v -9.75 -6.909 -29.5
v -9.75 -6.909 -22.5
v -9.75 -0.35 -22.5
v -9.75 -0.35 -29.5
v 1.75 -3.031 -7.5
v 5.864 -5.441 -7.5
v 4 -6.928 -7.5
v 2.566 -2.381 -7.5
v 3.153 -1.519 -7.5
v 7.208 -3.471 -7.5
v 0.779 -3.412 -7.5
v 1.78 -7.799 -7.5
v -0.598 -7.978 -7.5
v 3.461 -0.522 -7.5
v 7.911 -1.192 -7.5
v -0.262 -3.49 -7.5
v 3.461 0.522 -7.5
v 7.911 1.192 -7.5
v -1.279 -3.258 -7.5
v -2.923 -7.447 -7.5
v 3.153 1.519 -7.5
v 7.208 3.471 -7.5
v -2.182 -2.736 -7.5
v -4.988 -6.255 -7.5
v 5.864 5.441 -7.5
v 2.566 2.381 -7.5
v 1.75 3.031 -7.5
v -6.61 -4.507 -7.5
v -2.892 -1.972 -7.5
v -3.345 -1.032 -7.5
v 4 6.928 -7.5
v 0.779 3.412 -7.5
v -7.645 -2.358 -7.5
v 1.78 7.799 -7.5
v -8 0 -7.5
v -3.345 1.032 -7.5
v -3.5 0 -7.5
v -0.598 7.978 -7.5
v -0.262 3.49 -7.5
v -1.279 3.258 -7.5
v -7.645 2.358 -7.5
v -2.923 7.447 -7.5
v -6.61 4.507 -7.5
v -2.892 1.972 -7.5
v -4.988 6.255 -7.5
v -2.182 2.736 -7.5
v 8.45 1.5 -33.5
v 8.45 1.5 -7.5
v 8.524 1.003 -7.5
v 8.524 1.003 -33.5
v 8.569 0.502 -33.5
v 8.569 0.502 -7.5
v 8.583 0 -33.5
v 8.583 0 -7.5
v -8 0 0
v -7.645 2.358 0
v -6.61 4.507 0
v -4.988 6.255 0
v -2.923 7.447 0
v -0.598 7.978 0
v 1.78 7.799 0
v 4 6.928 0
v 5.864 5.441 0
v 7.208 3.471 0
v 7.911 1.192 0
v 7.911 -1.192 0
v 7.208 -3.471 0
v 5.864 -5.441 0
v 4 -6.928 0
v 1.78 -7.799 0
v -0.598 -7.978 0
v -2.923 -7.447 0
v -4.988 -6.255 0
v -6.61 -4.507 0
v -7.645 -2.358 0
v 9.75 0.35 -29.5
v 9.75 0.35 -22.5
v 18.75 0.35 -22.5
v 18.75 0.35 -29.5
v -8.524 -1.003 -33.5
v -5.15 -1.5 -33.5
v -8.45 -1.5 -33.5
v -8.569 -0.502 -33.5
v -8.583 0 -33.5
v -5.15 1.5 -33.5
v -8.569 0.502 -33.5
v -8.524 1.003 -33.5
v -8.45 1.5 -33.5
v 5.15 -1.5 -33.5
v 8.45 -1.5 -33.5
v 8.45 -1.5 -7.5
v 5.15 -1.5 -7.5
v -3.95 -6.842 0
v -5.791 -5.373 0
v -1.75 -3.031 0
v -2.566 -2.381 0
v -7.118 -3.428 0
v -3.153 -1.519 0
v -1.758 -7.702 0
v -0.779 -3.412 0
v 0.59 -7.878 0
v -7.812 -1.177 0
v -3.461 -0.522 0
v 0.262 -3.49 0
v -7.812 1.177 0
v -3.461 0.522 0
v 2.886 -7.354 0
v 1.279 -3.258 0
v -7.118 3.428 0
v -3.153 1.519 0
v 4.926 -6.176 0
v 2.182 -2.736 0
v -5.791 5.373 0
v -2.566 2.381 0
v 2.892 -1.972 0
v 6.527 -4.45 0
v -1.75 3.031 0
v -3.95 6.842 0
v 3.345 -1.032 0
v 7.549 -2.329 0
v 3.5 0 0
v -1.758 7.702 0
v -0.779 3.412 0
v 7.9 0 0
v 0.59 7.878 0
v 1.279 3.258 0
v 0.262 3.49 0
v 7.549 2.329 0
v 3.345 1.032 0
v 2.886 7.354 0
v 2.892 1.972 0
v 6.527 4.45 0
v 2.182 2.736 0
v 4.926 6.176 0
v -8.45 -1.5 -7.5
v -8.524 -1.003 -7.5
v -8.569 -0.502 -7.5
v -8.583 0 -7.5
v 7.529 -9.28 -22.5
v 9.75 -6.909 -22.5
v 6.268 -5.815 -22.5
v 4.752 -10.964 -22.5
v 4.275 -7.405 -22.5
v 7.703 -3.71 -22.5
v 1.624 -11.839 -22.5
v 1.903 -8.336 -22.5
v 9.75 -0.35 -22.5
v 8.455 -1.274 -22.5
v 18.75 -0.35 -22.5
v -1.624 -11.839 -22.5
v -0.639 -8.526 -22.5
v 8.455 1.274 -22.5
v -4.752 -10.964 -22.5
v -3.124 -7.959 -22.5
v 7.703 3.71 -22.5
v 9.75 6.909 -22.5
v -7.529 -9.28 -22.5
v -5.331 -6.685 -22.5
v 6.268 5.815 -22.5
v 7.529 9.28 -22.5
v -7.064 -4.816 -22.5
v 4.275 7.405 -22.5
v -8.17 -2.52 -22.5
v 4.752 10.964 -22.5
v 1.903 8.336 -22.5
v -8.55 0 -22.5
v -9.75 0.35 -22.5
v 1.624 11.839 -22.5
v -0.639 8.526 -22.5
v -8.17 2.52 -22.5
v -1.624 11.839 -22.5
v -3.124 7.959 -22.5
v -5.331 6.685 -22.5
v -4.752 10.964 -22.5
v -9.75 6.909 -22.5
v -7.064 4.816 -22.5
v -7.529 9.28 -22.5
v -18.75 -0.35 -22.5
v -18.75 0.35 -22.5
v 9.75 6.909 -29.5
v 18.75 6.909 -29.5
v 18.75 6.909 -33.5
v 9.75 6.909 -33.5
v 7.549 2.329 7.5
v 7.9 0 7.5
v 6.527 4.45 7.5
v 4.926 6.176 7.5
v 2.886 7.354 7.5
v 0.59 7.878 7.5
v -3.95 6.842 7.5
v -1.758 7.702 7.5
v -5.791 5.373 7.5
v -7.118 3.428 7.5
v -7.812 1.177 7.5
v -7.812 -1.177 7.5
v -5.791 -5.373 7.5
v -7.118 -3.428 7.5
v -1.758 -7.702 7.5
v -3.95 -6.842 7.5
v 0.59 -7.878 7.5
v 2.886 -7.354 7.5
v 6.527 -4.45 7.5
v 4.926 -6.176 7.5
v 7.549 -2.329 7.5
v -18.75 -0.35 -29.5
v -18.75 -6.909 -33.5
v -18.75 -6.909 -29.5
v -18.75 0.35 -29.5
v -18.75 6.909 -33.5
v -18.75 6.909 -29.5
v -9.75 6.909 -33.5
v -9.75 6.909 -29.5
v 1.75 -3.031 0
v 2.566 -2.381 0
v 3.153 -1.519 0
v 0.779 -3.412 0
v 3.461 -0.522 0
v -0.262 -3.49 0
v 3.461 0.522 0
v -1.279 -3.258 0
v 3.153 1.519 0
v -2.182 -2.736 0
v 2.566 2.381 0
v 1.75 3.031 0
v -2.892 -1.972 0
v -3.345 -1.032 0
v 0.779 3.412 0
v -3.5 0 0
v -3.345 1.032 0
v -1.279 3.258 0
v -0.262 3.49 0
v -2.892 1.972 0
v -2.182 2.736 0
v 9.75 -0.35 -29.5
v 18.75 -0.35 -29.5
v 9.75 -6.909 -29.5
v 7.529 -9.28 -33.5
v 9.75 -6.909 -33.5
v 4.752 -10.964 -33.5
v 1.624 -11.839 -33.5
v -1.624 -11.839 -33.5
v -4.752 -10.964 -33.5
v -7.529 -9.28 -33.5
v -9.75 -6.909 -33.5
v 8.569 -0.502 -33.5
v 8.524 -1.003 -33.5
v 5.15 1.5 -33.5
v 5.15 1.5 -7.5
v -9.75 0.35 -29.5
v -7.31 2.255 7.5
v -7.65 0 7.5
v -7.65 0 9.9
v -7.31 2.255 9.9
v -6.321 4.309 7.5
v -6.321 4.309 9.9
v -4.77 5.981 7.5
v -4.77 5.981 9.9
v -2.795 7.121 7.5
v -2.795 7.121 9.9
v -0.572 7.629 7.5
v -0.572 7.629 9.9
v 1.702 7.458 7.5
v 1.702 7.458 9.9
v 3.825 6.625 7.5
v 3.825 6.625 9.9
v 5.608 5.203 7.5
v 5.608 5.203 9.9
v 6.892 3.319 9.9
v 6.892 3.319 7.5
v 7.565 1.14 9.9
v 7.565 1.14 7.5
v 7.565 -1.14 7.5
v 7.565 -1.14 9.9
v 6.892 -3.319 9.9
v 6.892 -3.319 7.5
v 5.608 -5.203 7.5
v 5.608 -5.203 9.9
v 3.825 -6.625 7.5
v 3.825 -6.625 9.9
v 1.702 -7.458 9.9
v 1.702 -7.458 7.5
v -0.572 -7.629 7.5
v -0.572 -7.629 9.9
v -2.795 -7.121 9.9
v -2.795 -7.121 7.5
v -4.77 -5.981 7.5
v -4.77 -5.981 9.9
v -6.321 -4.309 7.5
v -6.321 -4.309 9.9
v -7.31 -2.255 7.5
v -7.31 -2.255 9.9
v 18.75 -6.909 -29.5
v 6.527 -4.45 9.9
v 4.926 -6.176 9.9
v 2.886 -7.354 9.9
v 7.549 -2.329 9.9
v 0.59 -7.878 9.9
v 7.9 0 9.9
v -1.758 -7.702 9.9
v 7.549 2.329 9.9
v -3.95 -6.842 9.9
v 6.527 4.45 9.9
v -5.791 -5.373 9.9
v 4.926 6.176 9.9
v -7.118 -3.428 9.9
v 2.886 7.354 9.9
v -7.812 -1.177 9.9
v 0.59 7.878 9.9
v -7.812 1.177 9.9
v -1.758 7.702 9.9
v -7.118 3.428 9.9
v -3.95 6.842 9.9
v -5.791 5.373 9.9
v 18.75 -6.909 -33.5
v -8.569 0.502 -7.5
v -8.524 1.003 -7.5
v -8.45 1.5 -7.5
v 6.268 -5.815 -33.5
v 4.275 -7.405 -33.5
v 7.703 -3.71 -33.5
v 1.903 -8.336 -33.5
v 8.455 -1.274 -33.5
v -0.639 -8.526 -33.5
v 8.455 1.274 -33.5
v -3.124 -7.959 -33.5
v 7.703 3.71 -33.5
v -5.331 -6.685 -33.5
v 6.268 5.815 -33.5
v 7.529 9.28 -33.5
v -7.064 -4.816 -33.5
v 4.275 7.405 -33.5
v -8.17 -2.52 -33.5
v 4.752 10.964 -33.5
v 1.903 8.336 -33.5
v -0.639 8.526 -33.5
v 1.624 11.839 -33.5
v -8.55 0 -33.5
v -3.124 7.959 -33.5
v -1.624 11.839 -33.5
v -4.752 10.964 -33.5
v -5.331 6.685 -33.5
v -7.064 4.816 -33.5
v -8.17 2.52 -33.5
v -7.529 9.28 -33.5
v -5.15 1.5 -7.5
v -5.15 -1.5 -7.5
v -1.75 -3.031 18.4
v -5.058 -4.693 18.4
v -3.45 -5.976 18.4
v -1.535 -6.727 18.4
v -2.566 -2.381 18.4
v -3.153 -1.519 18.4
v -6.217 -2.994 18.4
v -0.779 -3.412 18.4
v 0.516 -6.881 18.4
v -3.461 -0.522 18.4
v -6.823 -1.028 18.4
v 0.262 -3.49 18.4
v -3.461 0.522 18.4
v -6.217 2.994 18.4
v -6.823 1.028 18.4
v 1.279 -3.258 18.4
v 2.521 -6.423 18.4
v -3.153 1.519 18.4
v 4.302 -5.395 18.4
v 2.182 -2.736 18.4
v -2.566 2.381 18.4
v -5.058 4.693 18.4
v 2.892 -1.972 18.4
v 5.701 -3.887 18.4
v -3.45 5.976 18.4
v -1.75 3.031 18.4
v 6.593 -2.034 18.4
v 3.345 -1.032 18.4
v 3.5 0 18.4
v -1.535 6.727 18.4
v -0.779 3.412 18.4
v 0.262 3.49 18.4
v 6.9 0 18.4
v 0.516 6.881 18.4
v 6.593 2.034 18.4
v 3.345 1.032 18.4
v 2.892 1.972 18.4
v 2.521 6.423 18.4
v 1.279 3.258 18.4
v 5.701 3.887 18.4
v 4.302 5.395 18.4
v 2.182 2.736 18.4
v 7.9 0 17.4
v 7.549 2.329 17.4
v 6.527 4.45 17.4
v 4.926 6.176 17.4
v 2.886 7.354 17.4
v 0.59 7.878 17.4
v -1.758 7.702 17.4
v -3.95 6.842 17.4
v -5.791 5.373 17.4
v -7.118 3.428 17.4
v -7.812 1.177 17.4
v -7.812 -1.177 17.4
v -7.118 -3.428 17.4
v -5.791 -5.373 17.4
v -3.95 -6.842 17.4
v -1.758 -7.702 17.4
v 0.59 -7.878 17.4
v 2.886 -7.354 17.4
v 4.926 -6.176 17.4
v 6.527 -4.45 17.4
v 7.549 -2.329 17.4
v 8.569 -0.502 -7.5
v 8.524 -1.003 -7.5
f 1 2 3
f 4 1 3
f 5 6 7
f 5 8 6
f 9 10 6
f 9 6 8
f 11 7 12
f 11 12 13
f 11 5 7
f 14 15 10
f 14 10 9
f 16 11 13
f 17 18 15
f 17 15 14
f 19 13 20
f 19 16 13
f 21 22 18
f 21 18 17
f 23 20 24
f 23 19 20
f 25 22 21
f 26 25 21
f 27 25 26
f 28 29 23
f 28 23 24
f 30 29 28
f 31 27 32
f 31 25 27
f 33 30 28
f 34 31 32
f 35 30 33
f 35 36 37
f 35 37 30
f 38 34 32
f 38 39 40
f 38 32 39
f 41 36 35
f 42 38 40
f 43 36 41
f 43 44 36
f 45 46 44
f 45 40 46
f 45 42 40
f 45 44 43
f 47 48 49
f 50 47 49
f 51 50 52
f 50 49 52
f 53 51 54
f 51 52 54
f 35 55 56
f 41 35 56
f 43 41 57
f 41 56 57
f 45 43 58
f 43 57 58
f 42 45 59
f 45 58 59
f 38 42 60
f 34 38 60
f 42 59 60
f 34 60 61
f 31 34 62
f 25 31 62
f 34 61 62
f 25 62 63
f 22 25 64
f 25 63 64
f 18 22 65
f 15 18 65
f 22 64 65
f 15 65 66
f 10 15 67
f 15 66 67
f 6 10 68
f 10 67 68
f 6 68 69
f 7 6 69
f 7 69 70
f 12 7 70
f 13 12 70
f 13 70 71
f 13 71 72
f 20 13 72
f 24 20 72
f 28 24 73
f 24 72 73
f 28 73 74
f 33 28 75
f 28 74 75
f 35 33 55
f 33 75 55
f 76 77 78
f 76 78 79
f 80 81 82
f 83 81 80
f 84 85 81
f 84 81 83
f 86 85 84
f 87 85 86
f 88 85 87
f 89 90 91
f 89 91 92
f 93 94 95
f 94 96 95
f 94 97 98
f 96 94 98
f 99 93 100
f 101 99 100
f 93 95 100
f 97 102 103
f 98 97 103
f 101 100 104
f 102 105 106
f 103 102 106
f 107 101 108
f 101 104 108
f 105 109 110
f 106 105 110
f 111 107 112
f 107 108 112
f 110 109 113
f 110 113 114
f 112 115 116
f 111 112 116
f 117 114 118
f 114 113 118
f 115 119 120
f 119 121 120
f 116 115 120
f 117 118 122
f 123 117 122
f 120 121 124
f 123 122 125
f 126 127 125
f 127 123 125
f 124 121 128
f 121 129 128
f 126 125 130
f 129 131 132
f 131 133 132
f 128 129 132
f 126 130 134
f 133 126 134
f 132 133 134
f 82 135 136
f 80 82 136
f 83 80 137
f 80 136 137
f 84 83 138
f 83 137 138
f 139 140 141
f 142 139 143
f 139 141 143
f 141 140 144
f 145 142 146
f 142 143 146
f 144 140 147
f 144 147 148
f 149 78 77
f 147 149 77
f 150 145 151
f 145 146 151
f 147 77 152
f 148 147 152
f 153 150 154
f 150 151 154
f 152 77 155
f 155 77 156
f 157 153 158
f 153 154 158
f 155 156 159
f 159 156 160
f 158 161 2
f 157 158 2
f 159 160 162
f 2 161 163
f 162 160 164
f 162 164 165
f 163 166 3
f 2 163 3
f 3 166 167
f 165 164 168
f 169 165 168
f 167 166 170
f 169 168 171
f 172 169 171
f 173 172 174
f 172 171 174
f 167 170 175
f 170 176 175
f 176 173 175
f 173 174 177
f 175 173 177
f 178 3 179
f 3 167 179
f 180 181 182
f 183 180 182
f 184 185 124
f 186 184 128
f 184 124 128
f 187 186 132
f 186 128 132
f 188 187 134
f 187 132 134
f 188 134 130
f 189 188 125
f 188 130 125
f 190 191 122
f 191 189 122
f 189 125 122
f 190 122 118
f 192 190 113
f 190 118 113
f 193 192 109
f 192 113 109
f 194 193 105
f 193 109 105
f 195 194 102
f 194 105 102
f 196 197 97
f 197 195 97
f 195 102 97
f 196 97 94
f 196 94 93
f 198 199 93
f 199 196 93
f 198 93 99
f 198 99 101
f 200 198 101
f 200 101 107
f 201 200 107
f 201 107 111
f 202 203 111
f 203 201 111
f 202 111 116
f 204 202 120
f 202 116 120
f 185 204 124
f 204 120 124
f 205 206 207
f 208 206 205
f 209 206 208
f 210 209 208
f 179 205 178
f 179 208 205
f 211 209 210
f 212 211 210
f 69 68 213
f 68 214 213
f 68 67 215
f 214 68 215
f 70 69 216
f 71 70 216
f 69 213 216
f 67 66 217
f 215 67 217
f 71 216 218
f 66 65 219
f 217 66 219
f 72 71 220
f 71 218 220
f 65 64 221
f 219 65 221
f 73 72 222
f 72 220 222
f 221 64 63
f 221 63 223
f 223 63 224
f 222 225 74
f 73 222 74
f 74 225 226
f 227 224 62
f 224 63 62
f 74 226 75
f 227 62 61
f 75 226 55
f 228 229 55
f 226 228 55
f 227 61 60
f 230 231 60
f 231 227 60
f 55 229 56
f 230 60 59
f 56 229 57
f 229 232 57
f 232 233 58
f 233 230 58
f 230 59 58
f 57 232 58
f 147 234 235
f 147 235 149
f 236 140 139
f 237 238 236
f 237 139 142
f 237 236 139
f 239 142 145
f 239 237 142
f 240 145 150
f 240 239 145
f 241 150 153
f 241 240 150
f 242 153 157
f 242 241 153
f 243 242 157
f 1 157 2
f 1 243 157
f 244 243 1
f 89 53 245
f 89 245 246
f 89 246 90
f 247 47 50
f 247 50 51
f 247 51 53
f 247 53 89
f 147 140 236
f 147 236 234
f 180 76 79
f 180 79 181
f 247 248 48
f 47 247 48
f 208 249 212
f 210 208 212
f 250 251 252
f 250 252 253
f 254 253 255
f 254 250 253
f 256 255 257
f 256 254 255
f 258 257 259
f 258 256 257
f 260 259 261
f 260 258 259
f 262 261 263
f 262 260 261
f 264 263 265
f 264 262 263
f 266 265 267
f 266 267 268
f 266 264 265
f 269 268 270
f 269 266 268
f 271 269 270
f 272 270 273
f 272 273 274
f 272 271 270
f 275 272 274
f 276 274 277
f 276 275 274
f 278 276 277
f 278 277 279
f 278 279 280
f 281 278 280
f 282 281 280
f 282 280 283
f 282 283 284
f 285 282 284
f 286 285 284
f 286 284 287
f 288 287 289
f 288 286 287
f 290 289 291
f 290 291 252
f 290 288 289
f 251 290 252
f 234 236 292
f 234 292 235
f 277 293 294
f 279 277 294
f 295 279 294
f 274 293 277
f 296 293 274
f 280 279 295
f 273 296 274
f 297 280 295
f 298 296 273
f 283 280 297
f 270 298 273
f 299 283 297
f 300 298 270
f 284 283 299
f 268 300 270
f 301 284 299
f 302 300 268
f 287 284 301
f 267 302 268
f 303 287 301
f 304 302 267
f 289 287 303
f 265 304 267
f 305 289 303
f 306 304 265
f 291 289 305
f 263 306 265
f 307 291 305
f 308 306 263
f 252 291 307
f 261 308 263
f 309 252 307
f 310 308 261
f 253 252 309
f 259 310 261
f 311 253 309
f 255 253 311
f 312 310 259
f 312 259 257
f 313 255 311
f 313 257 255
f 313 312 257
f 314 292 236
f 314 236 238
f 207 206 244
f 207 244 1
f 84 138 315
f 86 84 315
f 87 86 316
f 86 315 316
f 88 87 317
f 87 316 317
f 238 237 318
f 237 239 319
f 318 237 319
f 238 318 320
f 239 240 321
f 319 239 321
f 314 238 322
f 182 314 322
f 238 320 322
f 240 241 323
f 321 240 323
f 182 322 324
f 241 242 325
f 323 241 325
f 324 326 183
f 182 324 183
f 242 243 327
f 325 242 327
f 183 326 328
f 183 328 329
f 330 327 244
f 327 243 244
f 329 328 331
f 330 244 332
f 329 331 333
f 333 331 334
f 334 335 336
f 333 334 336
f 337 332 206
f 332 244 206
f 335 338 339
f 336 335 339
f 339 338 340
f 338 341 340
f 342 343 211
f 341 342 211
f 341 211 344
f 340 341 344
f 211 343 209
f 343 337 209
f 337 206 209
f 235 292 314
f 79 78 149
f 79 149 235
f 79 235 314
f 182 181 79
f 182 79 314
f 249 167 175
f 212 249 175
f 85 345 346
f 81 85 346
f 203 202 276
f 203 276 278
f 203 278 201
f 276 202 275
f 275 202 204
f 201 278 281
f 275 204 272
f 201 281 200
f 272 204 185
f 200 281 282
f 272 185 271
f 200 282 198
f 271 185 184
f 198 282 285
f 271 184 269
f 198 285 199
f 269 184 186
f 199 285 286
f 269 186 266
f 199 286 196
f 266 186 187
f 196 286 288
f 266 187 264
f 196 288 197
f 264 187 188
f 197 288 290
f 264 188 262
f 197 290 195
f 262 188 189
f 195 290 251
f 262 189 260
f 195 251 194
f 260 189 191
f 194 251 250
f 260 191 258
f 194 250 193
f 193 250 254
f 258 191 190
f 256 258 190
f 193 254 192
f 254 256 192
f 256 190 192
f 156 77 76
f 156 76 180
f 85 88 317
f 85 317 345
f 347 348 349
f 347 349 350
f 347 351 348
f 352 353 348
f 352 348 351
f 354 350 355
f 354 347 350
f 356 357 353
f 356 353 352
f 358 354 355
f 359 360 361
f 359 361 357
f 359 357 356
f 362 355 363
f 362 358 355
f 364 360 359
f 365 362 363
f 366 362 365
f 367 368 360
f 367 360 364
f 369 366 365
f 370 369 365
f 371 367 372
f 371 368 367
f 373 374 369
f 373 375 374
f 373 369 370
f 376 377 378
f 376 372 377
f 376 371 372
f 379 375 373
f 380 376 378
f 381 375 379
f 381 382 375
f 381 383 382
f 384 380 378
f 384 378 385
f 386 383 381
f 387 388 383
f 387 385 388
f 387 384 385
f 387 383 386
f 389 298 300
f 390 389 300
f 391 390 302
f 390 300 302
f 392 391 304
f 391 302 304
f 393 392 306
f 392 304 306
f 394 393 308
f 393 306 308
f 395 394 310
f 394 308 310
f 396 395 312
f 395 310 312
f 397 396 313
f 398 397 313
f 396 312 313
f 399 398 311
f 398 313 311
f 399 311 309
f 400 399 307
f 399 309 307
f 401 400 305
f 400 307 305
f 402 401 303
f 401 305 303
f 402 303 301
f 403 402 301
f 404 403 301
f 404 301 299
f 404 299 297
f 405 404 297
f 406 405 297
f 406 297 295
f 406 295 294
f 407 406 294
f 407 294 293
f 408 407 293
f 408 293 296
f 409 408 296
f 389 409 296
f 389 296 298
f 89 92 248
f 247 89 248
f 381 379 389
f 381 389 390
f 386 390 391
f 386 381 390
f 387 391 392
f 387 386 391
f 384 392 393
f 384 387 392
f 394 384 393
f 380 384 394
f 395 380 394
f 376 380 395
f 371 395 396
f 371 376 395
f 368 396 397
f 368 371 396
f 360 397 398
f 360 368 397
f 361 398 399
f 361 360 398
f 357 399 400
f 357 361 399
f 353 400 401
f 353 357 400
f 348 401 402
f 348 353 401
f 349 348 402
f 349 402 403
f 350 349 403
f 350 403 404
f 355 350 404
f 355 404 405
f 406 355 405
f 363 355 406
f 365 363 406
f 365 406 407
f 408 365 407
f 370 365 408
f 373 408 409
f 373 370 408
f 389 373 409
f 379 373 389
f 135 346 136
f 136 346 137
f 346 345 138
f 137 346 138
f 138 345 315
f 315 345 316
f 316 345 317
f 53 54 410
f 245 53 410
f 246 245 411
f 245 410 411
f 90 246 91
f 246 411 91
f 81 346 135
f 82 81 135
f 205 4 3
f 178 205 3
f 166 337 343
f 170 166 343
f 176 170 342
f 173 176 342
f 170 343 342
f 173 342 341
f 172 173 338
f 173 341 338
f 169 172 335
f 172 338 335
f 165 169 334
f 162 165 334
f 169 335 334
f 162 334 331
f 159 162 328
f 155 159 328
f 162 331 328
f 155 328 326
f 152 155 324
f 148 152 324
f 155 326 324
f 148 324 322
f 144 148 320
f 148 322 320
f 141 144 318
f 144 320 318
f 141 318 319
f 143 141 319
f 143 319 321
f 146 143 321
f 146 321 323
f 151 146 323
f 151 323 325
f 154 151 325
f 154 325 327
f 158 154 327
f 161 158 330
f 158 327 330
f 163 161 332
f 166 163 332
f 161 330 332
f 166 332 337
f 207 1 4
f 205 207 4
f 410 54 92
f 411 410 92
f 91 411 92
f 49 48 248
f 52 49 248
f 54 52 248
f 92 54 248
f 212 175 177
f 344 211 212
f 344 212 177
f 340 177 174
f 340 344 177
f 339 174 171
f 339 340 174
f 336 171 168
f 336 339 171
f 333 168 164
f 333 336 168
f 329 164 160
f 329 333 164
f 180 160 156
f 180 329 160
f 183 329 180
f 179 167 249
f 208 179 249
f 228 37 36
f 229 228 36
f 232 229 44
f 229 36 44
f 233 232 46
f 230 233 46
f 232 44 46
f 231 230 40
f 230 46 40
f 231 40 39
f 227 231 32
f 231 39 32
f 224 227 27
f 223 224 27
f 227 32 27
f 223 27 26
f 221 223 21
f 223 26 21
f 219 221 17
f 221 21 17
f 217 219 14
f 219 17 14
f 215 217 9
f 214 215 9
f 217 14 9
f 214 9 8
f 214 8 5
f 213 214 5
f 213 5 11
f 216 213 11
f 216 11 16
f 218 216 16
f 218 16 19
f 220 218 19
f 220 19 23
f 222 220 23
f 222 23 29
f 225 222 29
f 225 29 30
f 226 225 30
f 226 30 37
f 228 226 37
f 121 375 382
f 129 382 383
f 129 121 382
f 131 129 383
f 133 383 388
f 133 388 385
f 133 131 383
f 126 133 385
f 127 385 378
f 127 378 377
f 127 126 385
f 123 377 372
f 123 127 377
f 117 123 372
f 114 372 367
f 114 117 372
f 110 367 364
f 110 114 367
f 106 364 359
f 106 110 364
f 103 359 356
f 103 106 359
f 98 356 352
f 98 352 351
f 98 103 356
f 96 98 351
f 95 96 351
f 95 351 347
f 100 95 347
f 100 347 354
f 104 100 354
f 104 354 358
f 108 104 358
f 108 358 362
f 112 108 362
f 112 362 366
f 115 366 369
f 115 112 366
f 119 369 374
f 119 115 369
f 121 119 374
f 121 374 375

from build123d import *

# Parameters (mm, degrees)
SKETCH1_R             = 7.9
SKETCH1_R_2           = 3.5
BOSS_EXTRUDE1_DEPTH   = 18.4
CHAMFER1_SIZE         = 1
CUT_EXTRUDE6_START    = 2.4
SKETCH19_R            = 7.9
SKETCH19_R_2          = 7.65
CUT_EXTRUDE6_DEPTH    = 2.4
SKETCH24_R            = 8
BOSS_EXTRUDE5_DEPTH   = 7.5
BOSS_EXTRUDE6_DEPTH   = 26
BOSS_EXTRUDE6_2_DEPTH = 26
SKETCH26_R            = 11.95
SKETCH26_R_2          = 8.55
BOSS_EXTRUDE7_DEPTH   = 11
CUT_EXTRUDE9_DEPTH    = 45.253982872
SKETCH28_R            = 3.5
CUT_EXTRUDE10_DEPTH   = 31.230200132
SKETCH29_W            = 4
SKETCH29_H            = 13.818827736
BOSS_EXTRUDE8_DEPTH   = 9
SKETCH30_W            = 4
SKETCH30_H            = 13.818827736
BOSS_EXTRUDE9_DEPTH   = 9
BOSS_EXTRUDE10_DEPTH  = 9
BOSS_EXTRUDE11_DEPTH  = 9


with BuildPart() as part:
    # Sketch1 → Boss-Extrude1 (new body)
    with BuildSketch(Plane.XY):
        Circle(SKETCH1_R)
        Circle(SKETCH1_R_2, mode=Mode.SUBTRACT)
    extrude(amount=BOSS_EXTRUDE1_DEPTH)

    # Chamfer1
    chamfer1_edges = [part.edges().sort_by_distance(p)[0] for p in [
        (-7.9, 0, 18.4),
    ]]
    chamfer(chamfer1_edges, length=CHAMFER1_SIZE)

    # Sketch19 → Cut-Extrude6 (cut)
    with BuildSketch(Plane(origin=(0, 0, 9.9), x_dir=(-1, 0, 0), z_dir=(0, 0, -1)).offset(CUT_EXTRUDE6_START)):
        Circle(SKETCH19_R)
        Circle(SKETCH19_R_2, mode=Mode.SUBTRACT)
    extrude(amount=-CUT_EXTRUDE6_DEPTH, mode=Mode.SUBTRACT)


with BuildPart() as body_2:
    # Sketch24 → Boss-Extrude5 (new body)
    with BuildSketch(Plane(origin=(0, 0, 0), x_dir=(-1, 0, 0), z_dir=(0, 0, -1))):
        Circle(SKETCH24_R)
    extrude(amount=BOSS_EXTRUDE5_DEPTH)

    # Sketch28 → Cut-Extrude10 (cut, through all)
    with BuildSketch(Plane(origin=(0, 0, -7.5), x_dir=(-1, 0, 0), z_dir=(0, 0, -1))):
        Circle(SKETCH28_R)
    extrude(amount=-CUT_EXTRUDE10_DEPTH, mode=Mode.SUBTRACT)


with BuildPart() as body_3:
    # Sketch25 → Boss-Extrude6 (new body)
    with BuildSketch(Plane(origin=(0, 0, -7.5), x_dir=(-1, 0, 0), z_dir=(0, 0, -1))):
        with BuildLine():
            Line((-5.15, 1.5), (-8.45, 1.5))
            ThreePointArc((-8.45, 1.5), (-8.549984118, 0.752960074), (-8.583399735, 0))
            ThreePointArc((-8.583399735, 0), (-8.549984118, -0.752960074), (-8.45, -1.5))
            Line((-8.45, -1.5), (-5.15, -1.5))
            Line((-5.15, -1.5), (-5.15, 0))
            Line((-5.15, 0), (-5.15, 1.5))
        make_face()
    extrude(amount=BOSS_EXTRUDE6_DEPTH)


with BuildPart() as body_4:
    # Sketch25 → Boss-Extrude6 2 (new body)
    with BuildSketch(Plane(origin=(0, 0, -7.5), x_dir=(-1, 0, 0), z_dir=(0, 0, -1))):
        with BuildLine():
            Line((5.15, 1.5), (5.15, 0))
            Line((5.15, 0), (5.15, -1.5))
            Line((5.15, -1.5), (8.45, -1.5))
            ThreePointArc((8.45, -1.5), (8.549984118, -0.752960074), (8.583399735, 0))
            ThreePointArc((8.583399735, 0), (8.549984118, 0.752960074), (8.45, 1.5))
            Line((8.45, 1.5), (5.15, 1.5))
        make_face()
    extrude(amount=BOSS_EXTRUDE6_2_DEPTH)


with BuildPart() as body_5:
    # Sketch26 → Boss-Extrude7 (new body)
    with BuildSketch(Plane(origin=(0, 0, -33.5), x_dir=(-1, 0, 0), z_dir=(0, 0, -1))):
        Circle(SKETCH26_R)
        Circle(SKETCH26_R_2, mode=Mode.SUBTRACT)
    extrude(amount=-BOSS_EXTRUDE7_DEPTH)

    # Sketch27 → Cut-Extrude9 (cut, through all)
    with BuildSketch(Plane.XY.offset(-22.5)):
        with BuildLine():
            Line((-9.75, 0), (-9.75, 6.909413868))
            ThreePointArc((-9.75, 6.909413868), (-11.95, 0), (-9.75, -6.909413868))
            Line((-9.75, -6.909413868), (-9.75, 0))
        make_face()
        with BuildLine():
            Line((9.75, 0), (9.75, 6.909413868))
            ThreePointArc((9.75, 6.909413868), (11.95, 0), (9.75, -6.909413868))
            Line((9.75, -6.909413868), (9.75, 0))
        make_face()
    extrude(amount=-CUT_EXTRUDE9_DEPTH, mode=Mode.SUBTRACT)

    # Sketch29 → Boss-Extrude8 (add)
    with BuildSketch(Plane.ZY.offset(9.75)):
        with Locations((-31.5, 0)):
            Rectangle(SKETCH29_W, SKETCH29_H)
    extrude(amount=BOSS_EXTRUDE8_DEPTH)

    # Sketch30 → Boss-Extrude9 (add)
    with BuildSketch(Plane(origin=(9.75, 0, 0), x_dir=(0, 0, -1), z_dir=(1, 0, 0))):
        with Locations((31.5, 0)):
            Rectangle(SKETCH30_W, SKETCH30_H)
    extrude(amount=BOSS_EXTRUDE9_DEPTH)

    # Sketch31 → Boss-Extrude10 (add)
    with BuildSketch(Plane(origin=(9.75, 0, 0), x_dir=(0, 0, -1), z_dir=(1, 0, 0))):
        Polygon((22.5, 0), (22.5, 0.35), (29.5, 0.35), (29.5, -0.35), (22.5, -0.35), align=None)
    extrude(amount=BOSS_EXTRUDE10_DEPTH)

    # Sketch32 → Boss-Extrude11 (add)
    with BuildSketch(Plane.ZY.offset(9.75)):
        Polygon((-22.5, 0), (-22.5, 0.35), (-29.5, 0.35), (-29.5, -0.35), (-22.5, -0.35), align=None)
    extrude(amount=BOSS_EXTRUDE11_DEPTH)


solid = Compound([part.part, body_2.part, body_3.part, body_4.part, body_5.part])
